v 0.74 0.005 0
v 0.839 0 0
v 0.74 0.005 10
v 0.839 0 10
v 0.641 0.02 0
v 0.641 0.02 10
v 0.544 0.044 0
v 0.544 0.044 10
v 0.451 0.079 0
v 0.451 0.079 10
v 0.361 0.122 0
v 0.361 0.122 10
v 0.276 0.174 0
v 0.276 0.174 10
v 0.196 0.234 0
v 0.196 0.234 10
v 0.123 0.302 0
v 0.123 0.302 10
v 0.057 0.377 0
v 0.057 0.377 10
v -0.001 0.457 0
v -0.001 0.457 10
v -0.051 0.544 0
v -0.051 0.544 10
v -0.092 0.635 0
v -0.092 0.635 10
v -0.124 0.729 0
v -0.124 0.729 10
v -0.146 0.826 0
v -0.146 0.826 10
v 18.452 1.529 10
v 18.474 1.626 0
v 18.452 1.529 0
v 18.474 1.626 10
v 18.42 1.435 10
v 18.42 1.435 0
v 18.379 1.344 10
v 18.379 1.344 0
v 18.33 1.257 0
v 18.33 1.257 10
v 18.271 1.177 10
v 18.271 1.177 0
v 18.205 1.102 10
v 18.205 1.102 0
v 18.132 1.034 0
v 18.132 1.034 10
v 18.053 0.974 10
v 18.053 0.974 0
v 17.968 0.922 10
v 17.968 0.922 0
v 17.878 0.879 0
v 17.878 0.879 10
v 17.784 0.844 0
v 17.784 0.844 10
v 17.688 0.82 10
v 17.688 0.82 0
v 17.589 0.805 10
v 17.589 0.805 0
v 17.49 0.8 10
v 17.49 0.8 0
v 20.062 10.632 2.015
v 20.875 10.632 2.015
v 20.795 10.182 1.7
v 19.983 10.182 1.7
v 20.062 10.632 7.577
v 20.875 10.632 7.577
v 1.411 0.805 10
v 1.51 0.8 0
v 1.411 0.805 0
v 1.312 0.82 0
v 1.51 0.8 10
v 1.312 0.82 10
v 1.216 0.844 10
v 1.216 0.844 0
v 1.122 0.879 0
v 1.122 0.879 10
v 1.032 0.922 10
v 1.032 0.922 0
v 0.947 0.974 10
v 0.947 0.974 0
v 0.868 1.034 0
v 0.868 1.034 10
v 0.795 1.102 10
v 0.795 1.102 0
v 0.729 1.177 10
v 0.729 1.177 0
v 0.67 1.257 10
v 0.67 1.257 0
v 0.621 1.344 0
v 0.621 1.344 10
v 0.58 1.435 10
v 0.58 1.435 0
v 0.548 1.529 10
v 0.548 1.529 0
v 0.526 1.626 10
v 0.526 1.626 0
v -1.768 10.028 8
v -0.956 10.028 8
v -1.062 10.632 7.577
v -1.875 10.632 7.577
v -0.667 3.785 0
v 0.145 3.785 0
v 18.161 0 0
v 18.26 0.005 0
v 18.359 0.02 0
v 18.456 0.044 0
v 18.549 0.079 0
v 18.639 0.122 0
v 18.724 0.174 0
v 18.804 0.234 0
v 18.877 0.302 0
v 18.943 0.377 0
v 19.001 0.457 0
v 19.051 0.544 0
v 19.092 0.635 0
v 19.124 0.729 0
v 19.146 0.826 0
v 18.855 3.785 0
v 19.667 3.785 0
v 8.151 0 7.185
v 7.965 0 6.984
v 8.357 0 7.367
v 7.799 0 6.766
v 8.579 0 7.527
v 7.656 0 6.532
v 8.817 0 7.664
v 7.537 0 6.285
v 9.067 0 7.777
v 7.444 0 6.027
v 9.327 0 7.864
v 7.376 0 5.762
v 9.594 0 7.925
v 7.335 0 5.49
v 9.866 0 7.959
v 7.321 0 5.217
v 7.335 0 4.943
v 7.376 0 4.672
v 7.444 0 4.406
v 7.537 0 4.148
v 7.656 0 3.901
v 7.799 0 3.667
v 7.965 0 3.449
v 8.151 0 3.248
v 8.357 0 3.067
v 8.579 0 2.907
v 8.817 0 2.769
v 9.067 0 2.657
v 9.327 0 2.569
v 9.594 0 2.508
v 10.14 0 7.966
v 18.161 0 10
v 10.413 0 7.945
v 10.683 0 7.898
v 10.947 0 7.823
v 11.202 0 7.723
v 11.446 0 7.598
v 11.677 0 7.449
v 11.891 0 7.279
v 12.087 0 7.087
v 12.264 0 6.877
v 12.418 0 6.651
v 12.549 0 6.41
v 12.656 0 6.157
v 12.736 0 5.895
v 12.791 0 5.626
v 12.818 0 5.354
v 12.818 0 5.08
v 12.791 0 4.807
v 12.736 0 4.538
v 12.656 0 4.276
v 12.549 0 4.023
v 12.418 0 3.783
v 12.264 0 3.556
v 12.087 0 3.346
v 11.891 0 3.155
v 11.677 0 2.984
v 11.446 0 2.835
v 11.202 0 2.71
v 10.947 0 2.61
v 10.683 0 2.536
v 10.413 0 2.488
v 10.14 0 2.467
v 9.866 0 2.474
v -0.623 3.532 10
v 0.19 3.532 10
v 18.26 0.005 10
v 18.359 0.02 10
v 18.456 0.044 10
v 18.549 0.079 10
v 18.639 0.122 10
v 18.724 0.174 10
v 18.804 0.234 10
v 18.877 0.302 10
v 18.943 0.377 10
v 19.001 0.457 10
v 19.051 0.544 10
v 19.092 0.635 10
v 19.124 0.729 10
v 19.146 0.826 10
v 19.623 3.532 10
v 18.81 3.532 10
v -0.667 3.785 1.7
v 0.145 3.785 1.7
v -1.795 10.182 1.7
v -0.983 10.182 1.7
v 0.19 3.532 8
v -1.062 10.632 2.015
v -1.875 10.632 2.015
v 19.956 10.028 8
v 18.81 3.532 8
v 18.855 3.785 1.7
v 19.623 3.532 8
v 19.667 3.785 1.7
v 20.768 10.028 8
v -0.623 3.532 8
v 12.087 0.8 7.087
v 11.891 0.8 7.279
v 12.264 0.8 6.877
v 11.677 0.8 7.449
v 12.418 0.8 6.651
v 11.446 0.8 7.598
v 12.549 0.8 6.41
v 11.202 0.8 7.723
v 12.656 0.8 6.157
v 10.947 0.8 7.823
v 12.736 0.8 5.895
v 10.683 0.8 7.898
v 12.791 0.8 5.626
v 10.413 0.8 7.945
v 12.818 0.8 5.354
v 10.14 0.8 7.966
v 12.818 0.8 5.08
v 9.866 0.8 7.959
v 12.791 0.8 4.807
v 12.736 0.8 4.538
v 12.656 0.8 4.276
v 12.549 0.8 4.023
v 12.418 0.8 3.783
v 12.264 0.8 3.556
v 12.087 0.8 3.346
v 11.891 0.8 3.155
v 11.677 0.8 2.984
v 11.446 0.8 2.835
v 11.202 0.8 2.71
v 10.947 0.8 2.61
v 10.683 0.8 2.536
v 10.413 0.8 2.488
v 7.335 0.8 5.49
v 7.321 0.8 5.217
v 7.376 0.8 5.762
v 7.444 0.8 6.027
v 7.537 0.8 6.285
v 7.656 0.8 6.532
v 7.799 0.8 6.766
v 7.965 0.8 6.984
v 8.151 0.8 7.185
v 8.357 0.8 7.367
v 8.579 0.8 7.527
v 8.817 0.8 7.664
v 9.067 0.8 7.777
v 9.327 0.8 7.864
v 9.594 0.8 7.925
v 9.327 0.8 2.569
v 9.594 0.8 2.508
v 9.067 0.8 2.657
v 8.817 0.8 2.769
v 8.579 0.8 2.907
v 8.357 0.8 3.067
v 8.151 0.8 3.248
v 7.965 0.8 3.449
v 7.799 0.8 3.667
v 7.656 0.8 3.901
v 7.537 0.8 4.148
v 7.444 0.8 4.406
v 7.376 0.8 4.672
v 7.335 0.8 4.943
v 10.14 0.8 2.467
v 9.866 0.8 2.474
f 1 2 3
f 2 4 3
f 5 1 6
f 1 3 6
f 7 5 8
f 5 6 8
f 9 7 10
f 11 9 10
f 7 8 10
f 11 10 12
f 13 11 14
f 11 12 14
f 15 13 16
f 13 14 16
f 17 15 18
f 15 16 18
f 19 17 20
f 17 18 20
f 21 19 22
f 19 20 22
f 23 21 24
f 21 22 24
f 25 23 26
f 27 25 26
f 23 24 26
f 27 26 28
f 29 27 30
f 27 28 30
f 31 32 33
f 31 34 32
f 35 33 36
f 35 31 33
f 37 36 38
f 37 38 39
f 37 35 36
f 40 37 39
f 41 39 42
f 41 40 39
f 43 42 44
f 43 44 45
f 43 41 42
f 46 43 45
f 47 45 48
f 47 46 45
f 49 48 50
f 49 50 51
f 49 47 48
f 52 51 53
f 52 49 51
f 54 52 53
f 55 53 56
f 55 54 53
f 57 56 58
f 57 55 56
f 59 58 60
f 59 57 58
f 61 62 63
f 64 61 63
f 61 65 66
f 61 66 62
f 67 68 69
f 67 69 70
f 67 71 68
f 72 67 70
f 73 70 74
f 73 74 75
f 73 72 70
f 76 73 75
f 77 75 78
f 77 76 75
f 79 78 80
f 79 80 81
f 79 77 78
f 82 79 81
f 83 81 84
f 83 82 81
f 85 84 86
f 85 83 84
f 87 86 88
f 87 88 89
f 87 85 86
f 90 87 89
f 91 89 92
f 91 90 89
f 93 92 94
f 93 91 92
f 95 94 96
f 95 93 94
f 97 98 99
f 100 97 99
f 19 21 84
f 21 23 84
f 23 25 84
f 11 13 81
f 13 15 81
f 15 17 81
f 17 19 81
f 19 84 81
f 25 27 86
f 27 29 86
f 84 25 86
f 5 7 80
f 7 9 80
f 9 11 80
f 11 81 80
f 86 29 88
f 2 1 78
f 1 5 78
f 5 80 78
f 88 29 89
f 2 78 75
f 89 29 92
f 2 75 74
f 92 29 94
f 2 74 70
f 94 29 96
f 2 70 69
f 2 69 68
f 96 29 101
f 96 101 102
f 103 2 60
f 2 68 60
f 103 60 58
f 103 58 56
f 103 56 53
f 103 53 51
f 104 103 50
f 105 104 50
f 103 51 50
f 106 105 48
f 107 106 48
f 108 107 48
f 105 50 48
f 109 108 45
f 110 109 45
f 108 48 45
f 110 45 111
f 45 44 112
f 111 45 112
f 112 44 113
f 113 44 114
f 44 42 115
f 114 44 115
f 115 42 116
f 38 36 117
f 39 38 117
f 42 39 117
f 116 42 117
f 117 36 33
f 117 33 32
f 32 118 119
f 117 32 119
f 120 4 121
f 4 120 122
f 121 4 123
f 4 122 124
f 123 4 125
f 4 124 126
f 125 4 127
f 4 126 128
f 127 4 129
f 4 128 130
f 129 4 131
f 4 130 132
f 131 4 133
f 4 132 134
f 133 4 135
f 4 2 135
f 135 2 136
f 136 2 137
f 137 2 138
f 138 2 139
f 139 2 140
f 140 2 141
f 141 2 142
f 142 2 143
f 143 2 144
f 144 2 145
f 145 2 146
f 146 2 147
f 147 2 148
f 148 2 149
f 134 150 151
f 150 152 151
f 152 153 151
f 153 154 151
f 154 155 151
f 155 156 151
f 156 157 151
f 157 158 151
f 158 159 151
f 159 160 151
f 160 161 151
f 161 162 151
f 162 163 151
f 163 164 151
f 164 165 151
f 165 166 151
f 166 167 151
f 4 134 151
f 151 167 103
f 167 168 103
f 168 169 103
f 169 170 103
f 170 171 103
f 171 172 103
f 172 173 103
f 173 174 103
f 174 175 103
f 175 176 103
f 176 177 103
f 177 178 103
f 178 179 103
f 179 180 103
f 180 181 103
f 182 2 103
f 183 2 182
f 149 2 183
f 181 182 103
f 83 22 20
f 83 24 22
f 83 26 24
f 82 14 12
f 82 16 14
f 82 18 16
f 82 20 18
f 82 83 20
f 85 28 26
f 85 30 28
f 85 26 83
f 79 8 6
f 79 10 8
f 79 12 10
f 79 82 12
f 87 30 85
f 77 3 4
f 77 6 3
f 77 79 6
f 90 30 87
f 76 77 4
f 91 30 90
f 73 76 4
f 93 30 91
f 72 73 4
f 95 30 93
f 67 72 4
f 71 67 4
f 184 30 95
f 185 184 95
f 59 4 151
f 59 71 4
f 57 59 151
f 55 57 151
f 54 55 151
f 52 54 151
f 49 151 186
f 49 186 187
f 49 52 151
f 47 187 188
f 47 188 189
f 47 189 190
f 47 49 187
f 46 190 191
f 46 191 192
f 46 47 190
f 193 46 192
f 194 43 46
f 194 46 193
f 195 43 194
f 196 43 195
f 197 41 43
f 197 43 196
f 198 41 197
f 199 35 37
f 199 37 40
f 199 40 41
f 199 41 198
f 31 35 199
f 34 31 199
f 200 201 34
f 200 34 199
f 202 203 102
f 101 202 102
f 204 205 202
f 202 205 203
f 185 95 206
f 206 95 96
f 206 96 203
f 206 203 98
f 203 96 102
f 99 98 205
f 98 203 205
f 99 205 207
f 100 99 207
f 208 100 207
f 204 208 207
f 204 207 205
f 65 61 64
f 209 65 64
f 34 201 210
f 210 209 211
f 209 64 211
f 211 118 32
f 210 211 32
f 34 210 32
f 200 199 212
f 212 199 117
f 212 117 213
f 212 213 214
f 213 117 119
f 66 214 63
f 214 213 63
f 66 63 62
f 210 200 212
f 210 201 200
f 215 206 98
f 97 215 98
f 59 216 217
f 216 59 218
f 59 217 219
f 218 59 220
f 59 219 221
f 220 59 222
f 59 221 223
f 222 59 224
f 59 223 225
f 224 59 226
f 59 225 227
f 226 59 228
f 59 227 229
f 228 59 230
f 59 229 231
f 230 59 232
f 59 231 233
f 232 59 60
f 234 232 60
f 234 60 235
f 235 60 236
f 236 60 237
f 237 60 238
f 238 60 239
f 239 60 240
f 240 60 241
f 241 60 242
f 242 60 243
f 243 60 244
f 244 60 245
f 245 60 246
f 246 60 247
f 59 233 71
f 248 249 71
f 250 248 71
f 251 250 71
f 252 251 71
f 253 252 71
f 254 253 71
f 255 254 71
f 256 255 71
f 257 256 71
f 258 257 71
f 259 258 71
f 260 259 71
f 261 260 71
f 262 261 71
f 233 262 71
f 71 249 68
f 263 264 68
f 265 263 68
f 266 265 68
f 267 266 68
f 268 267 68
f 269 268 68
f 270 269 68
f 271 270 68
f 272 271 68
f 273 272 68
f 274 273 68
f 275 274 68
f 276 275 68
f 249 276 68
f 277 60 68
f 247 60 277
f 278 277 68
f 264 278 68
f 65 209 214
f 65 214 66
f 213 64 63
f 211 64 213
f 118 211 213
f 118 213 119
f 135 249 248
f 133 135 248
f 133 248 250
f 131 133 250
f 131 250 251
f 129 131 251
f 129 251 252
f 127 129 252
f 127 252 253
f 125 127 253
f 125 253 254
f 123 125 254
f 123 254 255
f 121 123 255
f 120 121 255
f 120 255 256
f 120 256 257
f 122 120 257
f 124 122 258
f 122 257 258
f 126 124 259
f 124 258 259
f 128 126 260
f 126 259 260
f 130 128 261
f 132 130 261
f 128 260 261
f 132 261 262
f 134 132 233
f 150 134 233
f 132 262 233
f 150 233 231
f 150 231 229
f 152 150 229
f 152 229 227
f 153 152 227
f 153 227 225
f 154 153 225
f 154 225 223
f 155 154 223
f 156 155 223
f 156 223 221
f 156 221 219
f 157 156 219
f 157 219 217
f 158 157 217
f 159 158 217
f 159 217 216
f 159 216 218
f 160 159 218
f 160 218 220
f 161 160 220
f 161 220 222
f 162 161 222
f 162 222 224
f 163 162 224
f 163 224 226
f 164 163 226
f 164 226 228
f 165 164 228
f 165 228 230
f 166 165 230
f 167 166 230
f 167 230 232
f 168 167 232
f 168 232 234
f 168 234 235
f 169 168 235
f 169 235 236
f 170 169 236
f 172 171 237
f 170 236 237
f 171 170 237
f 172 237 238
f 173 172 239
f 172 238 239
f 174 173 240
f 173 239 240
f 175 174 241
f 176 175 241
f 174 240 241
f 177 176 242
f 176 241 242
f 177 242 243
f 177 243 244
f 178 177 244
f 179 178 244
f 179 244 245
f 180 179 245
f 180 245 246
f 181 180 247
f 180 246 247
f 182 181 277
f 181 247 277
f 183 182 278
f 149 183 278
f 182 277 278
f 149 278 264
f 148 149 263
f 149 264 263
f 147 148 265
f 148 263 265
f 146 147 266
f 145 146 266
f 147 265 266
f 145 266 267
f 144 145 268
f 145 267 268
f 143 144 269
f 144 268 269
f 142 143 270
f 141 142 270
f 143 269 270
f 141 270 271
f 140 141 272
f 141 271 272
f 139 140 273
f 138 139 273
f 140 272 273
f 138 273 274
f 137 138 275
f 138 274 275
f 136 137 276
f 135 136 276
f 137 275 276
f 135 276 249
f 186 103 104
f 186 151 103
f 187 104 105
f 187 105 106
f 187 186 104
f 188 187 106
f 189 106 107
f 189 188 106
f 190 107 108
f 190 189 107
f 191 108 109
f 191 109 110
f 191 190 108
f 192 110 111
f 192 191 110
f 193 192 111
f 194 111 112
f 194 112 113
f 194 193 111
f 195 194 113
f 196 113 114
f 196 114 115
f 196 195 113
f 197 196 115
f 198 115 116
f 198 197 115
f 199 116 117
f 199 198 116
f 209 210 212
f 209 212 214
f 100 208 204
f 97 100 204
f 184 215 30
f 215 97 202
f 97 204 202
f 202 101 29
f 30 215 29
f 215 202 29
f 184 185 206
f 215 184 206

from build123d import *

# Parameters (mm, degrees)
PAD_DEPTH         = 10
POCKET_DEPTH      = 20.903093
POCKET_DEPTH_BACK = -1.903093
SKETCH002_R       = 2.75
HOLE_DEPTH        = 25
FILLET_R          = 1


with BuildPart() as part:
    # Sketch → Pad (new body)
    with BuildSketch(Plane.XY):
        Polygon((0, 0), (19, 0), (20.902093, 10.787306), (20.114247, 10.926225), (18.32872, 0.8), (0.67128, 0.8), (-1.114247, 10.926225), (-1.902093, 10.787306), align=None)
    extrude(amount=PAD_DEPTH)

    # Sketch001 (on DatumPlane) → Pocket (cut, two sides)
    with BuildSketch(Plane(origin=(0, 0.8, 0), x_dir=(0, -1, 0), z_dir=(-1, 0, 0))) as pocket_sk:
        Polygon((-2.732161, 10.911916), (-2.732161, 7.99998), (-9.228047, 7.99998), (-9.832161, 7.576975), (-9.832161, 2.015372), (-9.381735, 1.69998), (-2.985139, 1.69998), (-2.985139, -3.596473), (-13.732095, -3.596473), (-13.732095, 10.911916), align=None)
    extrude(amount=-POCKET_DEPTH, mode=Mode.SUBTRACT)
    extrude(pocket_sk.sketch, amount=-POCKET_DEPTH_BACK, mode=Mode.SUBTRACT)

    # Sketch002 (on Face21 of Pocket) → Hole (cut)
    with BuildSketch(Plane(origin=(0, 0.8, 0), x_dir=(-1, 0, 0), z_dir=(0, 1, 0))):
        with Locations((-10.071387, 5.216614)):
            Circle(SKETCH002_R)
    extrude(amount=-HOLE_DEPTH, mode=Mode.SUBTRACT)

    # Fillet
    fillet_edges = [part.edges().sort_by_distance(p)[0] for p in [
        (19, 0, 5),
        (0, 0, 5),
        (0.67128, 0.8, 5),
        (18.32872, 0.8, 5),
    ]]
    fillet(fillet_edges, radius=FILLET_R)


solid = part.part
